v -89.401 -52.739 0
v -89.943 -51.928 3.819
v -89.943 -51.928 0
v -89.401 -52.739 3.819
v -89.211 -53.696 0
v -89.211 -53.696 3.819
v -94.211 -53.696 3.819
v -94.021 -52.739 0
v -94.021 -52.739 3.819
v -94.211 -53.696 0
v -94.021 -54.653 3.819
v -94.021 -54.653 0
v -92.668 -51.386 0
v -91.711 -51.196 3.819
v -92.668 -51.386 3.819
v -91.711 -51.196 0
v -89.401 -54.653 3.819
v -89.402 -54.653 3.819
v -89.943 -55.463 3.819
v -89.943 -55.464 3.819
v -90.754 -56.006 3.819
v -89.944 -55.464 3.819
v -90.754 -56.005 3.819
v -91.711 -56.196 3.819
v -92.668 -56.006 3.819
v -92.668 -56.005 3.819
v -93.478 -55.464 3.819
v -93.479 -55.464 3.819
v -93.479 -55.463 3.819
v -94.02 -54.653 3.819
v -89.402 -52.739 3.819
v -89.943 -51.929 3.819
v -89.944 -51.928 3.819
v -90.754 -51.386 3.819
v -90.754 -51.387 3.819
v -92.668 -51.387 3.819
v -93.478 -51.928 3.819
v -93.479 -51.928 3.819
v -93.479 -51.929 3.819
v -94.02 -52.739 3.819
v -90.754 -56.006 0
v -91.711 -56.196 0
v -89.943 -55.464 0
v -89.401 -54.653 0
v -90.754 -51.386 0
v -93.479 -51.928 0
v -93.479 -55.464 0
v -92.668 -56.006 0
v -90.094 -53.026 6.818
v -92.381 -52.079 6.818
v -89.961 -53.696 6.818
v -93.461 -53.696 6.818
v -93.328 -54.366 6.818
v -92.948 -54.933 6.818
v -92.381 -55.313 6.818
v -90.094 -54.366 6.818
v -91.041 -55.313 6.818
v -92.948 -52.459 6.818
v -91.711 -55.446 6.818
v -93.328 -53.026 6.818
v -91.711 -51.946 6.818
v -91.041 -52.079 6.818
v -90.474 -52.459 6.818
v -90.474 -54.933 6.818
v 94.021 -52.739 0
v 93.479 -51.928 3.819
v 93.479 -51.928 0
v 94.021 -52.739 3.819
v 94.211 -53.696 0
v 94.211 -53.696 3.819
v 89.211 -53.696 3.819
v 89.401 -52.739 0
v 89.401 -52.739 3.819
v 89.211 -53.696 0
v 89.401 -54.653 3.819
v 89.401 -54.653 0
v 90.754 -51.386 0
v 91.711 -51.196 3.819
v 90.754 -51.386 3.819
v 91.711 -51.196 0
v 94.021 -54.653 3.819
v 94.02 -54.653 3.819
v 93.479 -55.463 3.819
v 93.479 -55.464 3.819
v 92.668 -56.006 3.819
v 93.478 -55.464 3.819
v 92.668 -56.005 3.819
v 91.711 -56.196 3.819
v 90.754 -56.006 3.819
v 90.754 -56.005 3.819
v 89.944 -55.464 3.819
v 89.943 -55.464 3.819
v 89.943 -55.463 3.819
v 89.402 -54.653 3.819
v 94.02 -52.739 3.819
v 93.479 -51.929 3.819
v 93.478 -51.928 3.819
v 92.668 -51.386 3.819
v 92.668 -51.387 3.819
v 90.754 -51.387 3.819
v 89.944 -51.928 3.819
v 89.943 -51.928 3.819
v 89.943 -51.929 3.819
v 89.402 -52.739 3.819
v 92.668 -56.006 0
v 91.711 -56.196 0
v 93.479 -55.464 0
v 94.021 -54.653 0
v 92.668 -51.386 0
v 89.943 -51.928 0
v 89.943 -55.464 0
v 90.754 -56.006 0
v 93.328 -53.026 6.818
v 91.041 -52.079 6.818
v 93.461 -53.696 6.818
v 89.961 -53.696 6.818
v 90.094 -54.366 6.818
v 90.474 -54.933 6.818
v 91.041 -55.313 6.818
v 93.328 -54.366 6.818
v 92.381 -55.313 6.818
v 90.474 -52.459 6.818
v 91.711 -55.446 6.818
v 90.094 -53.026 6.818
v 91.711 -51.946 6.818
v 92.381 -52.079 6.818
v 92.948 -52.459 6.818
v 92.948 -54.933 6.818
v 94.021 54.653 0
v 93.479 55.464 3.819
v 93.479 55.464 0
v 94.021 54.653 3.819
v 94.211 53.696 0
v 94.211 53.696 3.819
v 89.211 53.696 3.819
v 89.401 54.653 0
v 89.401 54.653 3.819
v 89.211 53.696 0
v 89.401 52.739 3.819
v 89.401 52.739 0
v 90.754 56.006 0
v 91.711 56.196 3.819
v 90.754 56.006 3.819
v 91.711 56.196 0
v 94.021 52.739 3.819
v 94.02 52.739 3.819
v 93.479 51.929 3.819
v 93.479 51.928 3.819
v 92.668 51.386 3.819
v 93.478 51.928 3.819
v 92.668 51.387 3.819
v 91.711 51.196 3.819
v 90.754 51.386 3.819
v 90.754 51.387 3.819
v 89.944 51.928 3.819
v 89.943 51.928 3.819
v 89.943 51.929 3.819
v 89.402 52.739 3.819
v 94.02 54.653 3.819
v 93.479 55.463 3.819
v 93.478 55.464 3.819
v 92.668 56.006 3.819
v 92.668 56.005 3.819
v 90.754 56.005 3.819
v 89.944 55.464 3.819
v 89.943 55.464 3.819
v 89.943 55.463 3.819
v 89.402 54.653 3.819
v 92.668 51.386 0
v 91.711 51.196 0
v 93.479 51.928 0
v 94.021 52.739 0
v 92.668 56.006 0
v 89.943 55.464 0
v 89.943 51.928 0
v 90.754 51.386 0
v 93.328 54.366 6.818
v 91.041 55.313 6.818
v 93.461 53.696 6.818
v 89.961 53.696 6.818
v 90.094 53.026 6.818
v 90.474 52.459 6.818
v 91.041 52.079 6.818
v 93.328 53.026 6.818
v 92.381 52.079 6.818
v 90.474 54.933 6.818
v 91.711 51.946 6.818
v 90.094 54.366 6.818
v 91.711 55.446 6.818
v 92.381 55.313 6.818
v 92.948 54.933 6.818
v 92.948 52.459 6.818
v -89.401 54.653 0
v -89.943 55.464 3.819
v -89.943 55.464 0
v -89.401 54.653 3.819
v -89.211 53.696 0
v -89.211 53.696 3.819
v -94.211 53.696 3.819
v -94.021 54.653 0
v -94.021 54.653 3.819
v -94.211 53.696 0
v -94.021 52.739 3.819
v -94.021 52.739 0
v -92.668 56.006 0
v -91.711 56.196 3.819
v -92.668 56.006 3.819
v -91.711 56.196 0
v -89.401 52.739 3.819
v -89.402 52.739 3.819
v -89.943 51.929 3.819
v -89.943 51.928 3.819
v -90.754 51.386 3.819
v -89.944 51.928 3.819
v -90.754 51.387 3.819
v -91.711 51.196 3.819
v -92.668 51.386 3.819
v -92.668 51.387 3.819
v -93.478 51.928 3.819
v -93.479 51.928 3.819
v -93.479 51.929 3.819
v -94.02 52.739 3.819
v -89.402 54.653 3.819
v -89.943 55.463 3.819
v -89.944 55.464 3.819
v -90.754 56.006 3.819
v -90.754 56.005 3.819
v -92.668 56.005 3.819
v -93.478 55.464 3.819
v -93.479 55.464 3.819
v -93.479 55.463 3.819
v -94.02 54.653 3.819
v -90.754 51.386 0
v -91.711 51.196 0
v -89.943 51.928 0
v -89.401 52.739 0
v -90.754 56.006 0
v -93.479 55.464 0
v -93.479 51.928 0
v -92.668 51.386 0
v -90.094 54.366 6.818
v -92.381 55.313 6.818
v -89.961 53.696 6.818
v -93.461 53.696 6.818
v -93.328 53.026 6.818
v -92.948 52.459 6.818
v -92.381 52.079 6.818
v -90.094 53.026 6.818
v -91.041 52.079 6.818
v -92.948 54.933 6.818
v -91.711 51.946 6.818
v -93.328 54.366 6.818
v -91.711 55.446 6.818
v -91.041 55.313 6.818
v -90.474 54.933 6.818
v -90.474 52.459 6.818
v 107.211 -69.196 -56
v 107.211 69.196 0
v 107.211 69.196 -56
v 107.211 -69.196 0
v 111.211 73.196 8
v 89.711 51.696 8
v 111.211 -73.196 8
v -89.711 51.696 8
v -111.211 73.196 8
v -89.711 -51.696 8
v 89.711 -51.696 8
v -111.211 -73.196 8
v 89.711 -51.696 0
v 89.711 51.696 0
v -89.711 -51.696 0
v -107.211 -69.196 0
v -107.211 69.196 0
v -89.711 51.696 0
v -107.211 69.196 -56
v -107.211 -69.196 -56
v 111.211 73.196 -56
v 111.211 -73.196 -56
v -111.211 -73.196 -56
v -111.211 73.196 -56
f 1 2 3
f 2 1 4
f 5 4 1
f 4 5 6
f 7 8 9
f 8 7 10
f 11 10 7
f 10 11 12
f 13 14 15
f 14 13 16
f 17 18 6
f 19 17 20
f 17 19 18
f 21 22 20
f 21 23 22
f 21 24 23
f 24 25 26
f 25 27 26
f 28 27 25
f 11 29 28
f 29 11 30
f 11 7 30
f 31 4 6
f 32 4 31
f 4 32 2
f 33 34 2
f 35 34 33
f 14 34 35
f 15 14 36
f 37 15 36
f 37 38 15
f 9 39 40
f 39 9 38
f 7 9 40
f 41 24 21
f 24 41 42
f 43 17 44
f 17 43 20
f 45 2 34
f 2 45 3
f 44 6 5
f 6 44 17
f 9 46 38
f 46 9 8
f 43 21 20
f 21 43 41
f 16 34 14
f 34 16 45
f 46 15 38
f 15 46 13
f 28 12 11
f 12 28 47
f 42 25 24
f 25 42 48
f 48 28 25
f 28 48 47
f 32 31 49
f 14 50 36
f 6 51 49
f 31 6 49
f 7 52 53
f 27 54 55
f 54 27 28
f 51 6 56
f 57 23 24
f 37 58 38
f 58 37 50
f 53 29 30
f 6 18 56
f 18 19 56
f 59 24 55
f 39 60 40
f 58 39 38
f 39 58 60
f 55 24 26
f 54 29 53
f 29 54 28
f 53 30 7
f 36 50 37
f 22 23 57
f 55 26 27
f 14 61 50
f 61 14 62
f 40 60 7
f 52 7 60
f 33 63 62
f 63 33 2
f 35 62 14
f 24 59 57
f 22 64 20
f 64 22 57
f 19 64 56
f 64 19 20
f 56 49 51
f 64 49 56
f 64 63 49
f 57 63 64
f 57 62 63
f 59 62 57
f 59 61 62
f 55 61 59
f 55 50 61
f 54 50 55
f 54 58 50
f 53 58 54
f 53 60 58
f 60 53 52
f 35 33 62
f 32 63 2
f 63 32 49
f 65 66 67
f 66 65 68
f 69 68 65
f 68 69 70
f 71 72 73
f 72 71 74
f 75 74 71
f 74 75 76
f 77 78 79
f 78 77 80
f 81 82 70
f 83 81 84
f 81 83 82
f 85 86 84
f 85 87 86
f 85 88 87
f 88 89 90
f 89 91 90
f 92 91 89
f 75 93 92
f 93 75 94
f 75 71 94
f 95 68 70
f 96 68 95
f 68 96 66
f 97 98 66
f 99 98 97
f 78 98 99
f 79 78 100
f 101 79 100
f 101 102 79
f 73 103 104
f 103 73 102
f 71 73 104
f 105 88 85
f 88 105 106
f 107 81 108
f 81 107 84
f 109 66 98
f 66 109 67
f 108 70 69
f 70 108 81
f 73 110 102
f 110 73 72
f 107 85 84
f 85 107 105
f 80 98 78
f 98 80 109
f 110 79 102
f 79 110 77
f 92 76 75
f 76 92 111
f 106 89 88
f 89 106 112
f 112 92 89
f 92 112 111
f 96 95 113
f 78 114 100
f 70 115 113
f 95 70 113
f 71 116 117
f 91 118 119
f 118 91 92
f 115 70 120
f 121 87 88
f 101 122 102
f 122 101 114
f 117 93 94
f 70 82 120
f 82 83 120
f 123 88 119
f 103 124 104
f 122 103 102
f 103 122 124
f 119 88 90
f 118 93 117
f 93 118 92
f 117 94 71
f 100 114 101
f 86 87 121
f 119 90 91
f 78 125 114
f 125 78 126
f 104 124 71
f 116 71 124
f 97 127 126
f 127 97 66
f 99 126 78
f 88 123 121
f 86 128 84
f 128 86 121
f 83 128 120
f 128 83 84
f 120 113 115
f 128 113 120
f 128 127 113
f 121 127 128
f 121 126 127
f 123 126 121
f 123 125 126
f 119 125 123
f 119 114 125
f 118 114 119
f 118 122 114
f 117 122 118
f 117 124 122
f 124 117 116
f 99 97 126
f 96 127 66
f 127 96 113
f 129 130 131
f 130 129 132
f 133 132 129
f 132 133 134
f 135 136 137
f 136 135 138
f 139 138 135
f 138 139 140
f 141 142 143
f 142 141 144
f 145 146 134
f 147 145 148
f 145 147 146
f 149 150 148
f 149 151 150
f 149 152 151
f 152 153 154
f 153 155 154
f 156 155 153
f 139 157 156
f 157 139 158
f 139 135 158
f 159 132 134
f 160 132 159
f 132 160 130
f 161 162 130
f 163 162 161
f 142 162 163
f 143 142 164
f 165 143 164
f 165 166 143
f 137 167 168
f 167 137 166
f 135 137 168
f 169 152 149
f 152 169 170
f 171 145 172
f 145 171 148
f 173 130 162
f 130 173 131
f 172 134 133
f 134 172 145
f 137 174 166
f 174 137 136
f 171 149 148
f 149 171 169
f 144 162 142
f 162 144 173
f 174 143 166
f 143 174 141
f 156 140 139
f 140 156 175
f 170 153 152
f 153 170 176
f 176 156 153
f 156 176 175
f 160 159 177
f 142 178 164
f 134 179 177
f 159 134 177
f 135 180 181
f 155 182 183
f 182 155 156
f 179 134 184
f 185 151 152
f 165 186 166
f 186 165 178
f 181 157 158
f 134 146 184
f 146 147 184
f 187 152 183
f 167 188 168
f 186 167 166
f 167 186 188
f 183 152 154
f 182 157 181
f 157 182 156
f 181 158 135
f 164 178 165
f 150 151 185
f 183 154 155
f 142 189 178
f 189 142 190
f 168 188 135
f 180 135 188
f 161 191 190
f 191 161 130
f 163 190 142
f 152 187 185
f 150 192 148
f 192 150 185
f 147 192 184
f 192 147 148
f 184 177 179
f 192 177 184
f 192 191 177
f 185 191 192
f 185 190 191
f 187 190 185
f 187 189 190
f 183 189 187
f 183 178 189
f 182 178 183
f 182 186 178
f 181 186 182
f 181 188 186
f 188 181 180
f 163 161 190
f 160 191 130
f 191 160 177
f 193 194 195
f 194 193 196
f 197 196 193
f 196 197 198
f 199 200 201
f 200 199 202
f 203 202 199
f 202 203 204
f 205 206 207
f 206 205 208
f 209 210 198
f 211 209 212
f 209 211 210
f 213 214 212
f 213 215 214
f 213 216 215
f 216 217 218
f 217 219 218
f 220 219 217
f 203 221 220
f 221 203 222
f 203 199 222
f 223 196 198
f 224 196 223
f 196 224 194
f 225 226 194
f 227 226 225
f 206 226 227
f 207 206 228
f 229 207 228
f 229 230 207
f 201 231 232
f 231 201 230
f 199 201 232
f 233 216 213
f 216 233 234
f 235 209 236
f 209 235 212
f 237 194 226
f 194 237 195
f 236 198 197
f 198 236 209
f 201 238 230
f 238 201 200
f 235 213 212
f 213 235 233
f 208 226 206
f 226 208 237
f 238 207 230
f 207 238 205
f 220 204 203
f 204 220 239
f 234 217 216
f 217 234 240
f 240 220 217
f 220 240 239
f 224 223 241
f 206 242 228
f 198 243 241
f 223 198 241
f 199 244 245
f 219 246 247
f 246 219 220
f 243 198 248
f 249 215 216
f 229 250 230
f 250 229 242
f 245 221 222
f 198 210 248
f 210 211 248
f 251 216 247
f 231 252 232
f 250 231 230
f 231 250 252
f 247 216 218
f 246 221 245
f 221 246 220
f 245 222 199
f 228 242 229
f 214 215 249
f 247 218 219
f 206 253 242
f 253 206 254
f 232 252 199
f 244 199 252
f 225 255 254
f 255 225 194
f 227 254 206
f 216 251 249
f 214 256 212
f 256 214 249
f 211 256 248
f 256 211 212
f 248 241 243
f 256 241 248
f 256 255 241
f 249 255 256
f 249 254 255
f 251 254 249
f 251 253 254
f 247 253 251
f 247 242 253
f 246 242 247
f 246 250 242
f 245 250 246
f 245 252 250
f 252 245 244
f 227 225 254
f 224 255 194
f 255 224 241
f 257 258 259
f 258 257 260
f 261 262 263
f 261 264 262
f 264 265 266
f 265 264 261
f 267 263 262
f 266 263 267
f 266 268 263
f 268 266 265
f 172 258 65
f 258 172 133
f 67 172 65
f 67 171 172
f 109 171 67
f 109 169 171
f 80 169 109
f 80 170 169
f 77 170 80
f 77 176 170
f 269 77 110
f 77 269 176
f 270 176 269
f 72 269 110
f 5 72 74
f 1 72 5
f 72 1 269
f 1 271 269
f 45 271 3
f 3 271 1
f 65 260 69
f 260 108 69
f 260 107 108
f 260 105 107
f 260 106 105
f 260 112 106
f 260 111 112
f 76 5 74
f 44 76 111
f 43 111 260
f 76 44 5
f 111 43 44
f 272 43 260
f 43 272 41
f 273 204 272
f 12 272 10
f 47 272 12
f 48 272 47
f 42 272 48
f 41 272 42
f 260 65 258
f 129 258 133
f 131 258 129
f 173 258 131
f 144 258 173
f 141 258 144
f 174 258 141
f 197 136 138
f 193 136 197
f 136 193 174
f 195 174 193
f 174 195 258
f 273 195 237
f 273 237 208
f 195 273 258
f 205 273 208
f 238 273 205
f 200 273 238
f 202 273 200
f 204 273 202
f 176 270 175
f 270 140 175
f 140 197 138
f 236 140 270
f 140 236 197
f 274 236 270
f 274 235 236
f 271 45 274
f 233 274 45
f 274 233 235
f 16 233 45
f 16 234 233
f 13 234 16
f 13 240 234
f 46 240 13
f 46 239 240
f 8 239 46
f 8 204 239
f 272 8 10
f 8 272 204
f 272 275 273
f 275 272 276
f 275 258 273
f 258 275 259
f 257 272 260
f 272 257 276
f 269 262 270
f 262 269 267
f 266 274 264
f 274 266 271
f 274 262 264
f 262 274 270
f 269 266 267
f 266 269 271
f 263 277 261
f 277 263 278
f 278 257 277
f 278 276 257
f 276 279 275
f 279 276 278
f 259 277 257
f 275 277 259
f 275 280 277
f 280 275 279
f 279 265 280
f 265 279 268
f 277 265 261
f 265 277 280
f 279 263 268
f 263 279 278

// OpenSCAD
// file: ../pills/m3_insert.scad
module m3_insert() {
    translate([0, 0, -3.82/2])
        difference() {
            cylinder(h=3.82, r=2.5, center=true);
            cylinder(h = 4, r = 1.5, center=true);
        }
}

m3_insert();
// file: ../pills/power_connector.scad
$fs=1;
$fa=0.4;

width = 9.2;
height = 11;
depth = 14.5;

barrel_radius = 4.1;
barrel_top_offset = 0.5;

plate_thickness = 3.5;

bottom_depth = 14.5;

module power_connector() {
    difference() {
        translate([-plate_thickness/2, 0, -height/2])
            cube([plate_thickness, width, height], center=true);
        translate([-plate_thickness/2, -width/2+1.5/2-0.001, -1.5/2+0.001])
            cube([1.4, 1.5, 1.5], center=true);
        translate([-plate_thickness/2, +width/2-1.5/2+0.001, -1.5/2+0.002])
            cube([1.4, 1.5, 1.5], center=true);
    }
    translate([(depth-plate_thickness)/2-0.001, 0, -barrel_radius-barrel_top_offset])
        rotate([0, 90, 0])
        cylinder(h=depth-plate_thickness, r=barrel_radius, center=true);
    translate([bottom_depth/2-plate_thickness, 0, -height/2-(height-6.5)/2])
        cube([bottom_depth, width, 6.5], center=true);
    translate([bottom_depth/2-0.25, 0, -height/2-(height-6.5)/2-5])
        cube([8, width, 6], center=true);
}

power_connector();
// file: ../pills/negative_insert.scad
use <m3_insert.scad>

module negative_insert() {
    $fs=1;
    $fa=0.4;

    translate([0, 0, 3.82])
    union() {
        translate([0, 0, -(3.82/2)])
        cylinder(h=3.82, r=2.5, center=true);
        translate([0, 0, -0.001])
        linear_extrude(height=3, scale=0.7)
        circle(r=2.5);
    }
}

negative_insert();
// file: ../pills/dimensions.scad
function plate_width() = 193.422;
function plate_height() = 117.392;
function plate_thickness() = 3;
function separation() = 5;
function led_width() = 10;
function led_height() = 2.5;
function hole_radius() = 1.5;
function hole_offset() = 3.5 + hole_radius();
function separator_thickness() = (led_width()-plate_thickness())/2;

function electronics_width() = 81.3;
function electronics_height() = 50.7;
function electronics_thickness() = 23;
// main file
use <../pills/dimensions.scad>
use <../pills/negative_insert.scad>
use <../pills/power_connector.scad>

thickness = 4;

module front_cover() {
    // difference() {
    //     cube([
    //         plate_width(),
    //         plate_height(),
    //         3.5
    //         ], center=true);
    //     cube([
    //         plate_width() - hole_offset()*4 + 2,
    //         plate_height() - hole_offset()*4 + 2,
    //         3*2
    //         ], center=true);

    // }
    
    difference() {
        translate([0, 0, thickness])
        cube([
            plate_width() + led_height() * 2 + thickness*4,
            plate_height() + led_height() * 2 + thickness*4,
            thickness*2
            ], center=true);
        translate([0, 0, thickness])
        cube([
            plate_width() - hole_offset()*4 + 6,
            plate_height() - hole_offset()*4 + 6,
            thickness*3
            ], center=true);
        translate([-plate_width()/2 + hole_offset(), -plate_height()/2 + hole_offset(), -0.001])
            negative_insert();
        translate([plate_width()/2 - hole_offset(), -plate_height()/2 + hole_offset(), -0.001])
            negative_insert();
        translate([plate_width()/2 - hole_offset(), plate_height()/2 - hole_offset(), -0.001])
            negative_insert();
        translate([-plate_width()/2 + hole_offset(), plate_height()/2 - hole_offset(), -0.001])
            negative_insert();
    }

    translate([0, 0, -thickness*6])
    difference() {
        cube([
            plate_width() + led_height() * 2 + thickness*6,
            plate_height() + led_height() * 2 + thickness*6,
            thickness*16
            ], center=true);
        cube([
            plate_width() + led_height() * 2 + thickness*4,
            plate_height() + led_height() * 2 + thickness*4,
            thickness*30
            ], center=true);
    }
    // translate([-(plate_width() + led_height() * 2 + thickness*2)/2, 0, -thickness*7])
    // power_connector();

}

front_cover();
